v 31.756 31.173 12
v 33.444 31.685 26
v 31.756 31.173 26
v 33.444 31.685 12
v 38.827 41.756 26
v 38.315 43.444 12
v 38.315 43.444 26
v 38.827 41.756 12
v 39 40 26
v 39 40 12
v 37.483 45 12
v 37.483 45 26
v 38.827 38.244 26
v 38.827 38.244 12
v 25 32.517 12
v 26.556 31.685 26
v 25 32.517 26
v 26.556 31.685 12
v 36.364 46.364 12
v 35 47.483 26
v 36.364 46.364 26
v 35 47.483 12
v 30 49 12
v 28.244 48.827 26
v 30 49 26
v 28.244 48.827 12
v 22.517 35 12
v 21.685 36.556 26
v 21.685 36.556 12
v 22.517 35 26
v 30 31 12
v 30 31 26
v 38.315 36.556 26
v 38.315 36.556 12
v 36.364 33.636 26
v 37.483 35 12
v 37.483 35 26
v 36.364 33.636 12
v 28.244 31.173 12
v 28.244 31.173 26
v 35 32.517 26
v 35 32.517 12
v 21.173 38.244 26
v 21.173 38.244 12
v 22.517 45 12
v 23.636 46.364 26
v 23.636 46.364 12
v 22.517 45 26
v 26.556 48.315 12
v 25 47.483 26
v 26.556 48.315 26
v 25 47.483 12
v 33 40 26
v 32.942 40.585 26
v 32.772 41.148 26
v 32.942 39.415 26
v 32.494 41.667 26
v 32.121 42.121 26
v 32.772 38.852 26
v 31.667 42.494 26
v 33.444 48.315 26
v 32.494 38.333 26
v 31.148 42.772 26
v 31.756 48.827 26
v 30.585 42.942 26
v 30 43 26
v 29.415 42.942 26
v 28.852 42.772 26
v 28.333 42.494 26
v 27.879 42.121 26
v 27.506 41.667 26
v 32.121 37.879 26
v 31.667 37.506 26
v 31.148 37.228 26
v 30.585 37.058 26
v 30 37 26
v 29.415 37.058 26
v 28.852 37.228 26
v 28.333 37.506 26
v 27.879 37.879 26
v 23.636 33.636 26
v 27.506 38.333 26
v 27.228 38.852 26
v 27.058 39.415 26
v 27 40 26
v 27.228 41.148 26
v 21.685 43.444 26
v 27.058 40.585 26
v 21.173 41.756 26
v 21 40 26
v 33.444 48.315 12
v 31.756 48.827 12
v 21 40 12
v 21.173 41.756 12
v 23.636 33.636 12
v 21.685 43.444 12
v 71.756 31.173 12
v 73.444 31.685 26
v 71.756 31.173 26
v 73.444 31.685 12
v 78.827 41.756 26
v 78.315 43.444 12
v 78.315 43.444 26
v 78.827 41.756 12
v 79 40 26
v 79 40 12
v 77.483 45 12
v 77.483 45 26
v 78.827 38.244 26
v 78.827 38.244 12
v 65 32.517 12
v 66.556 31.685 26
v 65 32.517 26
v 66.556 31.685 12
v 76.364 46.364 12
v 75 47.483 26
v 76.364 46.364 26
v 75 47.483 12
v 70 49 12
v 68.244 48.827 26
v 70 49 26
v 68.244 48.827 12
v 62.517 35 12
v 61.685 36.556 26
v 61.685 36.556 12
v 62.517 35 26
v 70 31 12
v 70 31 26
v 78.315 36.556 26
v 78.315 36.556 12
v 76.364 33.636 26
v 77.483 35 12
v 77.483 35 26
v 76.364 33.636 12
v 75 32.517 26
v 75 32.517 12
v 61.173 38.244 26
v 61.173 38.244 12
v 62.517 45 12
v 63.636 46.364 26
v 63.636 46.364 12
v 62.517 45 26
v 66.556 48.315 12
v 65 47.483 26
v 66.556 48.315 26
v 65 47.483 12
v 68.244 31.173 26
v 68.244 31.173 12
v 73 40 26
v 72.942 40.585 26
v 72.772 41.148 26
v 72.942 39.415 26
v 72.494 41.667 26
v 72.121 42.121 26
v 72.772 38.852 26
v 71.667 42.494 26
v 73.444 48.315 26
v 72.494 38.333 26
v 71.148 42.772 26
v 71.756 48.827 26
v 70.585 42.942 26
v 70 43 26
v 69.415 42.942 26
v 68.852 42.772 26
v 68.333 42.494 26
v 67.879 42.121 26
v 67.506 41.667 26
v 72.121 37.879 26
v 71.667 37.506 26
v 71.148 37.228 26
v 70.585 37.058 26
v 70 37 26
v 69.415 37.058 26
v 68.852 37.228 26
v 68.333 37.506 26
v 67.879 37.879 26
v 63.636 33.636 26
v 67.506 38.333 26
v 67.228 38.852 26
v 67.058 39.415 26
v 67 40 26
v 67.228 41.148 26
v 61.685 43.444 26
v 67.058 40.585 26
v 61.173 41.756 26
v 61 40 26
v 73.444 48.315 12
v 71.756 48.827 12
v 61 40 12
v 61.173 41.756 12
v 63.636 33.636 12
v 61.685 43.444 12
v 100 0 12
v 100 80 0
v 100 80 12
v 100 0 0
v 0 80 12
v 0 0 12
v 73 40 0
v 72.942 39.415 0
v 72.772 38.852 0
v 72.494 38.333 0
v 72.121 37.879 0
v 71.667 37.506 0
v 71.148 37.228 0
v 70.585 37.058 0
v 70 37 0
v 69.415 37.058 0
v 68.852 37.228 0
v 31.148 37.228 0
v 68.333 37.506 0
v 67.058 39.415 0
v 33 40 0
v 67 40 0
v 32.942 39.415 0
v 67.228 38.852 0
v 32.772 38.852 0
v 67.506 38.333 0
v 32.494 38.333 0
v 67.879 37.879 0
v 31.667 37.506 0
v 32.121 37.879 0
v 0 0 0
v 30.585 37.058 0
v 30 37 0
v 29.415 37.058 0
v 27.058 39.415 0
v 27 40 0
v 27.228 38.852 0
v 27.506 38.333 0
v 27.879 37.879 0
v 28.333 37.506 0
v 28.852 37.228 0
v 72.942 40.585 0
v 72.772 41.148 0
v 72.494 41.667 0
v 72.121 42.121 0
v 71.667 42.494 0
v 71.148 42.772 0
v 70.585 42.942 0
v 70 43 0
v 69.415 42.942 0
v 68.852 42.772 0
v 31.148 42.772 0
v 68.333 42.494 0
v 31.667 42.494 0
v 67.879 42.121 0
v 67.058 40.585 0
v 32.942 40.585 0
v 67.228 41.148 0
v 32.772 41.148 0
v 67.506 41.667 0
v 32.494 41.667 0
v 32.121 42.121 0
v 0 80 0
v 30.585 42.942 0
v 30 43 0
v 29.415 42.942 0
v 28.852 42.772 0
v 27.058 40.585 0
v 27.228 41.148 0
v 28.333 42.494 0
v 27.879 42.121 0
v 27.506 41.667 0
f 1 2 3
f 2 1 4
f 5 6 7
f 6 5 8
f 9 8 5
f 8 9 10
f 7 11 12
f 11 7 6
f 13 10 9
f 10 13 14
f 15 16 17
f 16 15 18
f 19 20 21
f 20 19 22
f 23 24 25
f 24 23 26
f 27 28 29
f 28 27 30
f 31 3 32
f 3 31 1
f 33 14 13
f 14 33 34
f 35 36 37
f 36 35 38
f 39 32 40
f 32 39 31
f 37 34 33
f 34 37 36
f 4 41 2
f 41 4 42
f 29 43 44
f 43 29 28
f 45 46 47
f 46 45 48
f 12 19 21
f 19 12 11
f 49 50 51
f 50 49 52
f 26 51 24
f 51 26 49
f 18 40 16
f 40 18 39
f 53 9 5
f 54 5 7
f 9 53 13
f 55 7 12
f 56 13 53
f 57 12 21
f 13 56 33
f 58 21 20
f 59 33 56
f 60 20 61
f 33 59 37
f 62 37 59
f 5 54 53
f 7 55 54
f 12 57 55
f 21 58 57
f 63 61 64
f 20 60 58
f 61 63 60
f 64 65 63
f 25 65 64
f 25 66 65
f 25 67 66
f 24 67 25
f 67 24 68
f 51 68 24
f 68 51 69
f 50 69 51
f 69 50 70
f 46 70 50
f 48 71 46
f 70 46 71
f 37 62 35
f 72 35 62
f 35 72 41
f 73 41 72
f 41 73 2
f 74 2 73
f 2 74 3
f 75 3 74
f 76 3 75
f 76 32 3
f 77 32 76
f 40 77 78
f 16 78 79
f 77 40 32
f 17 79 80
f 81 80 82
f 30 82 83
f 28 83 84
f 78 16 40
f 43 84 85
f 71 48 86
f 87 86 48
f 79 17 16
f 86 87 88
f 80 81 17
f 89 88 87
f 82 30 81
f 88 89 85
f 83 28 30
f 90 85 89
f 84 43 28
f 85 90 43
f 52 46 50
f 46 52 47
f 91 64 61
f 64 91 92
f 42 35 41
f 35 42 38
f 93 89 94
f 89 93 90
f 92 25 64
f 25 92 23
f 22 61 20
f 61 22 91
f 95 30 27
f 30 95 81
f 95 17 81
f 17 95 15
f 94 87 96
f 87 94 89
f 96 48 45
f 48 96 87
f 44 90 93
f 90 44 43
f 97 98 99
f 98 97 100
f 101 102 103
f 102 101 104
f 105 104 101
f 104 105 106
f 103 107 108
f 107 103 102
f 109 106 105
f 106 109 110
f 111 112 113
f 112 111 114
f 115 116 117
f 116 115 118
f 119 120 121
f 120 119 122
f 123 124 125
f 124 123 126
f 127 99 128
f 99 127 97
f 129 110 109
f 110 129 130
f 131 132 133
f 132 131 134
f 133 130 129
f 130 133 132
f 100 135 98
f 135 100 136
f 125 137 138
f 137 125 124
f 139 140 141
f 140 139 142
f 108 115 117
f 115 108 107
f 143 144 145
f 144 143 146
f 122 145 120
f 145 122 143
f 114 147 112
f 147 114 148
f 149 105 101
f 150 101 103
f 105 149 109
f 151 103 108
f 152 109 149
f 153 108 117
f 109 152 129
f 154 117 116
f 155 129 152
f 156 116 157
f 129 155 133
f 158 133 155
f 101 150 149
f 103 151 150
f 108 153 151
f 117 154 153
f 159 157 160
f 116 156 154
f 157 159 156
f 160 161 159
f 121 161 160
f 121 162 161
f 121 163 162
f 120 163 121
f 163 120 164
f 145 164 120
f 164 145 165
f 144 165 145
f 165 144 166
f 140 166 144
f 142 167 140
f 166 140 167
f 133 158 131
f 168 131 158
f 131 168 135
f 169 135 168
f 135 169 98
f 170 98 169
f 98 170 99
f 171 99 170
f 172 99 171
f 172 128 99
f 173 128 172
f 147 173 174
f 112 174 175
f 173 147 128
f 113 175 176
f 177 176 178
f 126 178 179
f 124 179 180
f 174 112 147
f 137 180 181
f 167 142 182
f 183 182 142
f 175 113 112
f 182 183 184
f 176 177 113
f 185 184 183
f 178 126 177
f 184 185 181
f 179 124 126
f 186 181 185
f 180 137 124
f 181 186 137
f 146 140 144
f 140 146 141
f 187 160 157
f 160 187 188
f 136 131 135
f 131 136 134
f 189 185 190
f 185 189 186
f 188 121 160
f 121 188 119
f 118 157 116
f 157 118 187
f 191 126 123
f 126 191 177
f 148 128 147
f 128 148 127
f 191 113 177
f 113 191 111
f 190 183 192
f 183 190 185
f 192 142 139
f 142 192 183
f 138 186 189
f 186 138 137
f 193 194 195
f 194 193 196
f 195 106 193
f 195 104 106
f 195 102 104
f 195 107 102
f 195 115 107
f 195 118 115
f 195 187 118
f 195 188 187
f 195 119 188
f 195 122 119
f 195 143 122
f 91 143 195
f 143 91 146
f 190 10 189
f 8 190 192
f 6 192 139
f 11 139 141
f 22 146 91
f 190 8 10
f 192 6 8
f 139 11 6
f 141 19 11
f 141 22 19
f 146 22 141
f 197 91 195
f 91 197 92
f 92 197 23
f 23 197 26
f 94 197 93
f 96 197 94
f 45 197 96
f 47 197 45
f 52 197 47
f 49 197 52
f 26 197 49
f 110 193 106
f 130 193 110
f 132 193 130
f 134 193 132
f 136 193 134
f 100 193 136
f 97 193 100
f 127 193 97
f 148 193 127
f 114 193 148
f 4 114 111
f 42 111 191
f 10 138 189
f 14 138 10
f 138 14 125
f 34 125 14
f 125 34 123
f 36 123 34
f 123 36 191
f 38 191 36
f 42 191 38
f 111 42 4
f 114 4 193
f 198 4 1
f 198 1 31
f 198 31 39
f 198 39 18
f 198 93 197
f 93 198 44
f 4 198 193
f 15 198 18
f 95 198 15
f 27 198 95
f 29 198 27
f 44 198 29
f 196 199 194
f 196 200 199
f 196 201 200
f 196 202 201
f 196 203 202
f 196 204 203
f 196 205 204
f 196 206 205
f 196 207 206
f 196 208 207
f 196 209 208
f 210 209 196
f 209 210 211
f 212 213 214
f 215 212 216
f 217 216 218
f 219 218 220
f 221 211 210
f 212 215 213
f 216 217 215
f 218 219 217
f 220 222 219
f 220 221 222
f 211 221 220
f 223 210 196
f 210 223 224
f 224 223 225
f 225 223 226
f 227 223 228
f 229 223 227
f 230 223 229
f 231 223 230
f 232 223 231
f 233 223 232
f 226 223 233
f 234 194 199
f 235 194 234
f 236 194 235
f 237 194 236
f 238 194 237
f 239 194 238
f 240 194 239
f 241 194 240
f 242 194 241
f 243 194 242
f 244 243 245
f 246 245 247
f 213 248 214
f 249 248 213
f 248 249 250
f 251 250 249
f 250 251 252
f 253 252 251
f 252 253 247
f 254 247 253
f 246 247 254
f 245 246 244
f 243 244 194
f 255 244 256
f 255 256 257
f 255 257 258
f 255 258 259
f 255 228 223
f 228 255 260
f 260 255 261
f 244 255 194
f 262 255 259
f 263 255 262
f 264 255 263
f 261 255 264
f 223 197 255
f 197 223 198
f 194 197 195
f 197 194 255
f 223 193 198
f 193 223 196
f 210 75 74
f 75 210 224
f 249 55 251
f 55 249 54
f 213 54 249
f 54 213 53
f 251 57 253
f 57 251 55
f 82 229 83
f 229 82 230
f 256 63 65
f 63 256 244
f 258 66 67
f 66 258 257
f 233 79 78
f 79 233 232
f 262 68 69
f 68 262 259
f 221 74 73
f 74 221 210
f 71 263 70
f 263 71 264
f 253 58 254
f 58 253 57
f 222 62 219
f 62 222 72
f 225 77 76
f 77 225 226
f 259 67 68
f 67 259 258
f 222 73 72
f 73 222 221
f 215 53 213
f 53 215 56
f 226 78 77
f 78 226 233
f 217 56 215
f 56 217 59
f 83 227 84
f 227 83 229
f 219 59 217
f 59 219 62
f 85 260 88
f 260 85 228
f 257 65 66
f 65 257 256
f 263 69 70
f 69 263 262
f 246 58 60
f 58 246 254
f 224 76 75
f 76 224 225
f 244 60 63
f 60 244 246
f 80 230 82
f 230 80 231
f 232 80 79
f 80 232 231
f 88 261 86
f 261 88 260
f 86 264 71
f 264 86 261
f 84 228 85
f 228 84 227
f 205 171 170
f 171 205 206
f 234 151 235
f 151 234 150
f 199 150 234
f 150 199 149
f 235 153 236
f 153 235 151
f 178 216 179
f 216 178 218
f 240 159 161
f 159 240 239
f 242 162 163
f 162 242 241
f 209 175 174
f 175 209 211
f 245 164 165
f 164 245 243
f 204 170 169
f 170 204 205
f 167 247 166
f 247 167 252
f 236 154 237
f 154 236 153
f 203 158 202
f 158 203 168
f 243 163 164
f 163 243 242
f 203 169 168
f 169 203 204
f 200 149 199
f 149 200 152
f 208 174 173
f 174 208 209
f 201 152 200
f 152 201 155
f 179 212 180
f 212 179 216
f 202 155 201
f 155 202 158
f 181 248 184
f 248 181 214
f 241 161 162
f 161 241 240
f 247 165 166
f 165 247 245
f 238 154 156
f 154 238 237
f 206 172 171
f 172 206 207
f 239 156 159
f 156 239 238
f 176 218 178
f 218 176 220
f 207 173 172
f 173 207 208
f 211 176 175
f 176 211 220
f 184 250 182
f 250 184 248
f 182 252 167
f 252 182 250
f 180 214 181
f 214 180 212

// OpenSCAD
$fn = 32;

// ----------------------------------------------------------------------
// Drill jig: two_boss jig
// ----------------------------------------------------------------------

// --- parameters (mm) ---
plate_l = 100;            // plate length, X
plate_w = 80;             // plate width, Y
plate_t = 12;             // plate thickness
boss_d = 18;              // guide boss diameter
boss_h = 15;              // boss height above the plate
guide_d = 6;              // guide hole diameter
boss_pitch = 40;          // boss pitch

n_boss = 2;  // guide bosses
boss_x0 = (plate_l - (n_boss - 1) * boss_pitch) / 2;  // first boss X
boss_top = plate_t - 1 + boss_h;  // boss crown height
total_h = boss_top;  // overall height

difference() {
  union() {
  cube([plate_l, plate_w, plate_t]);
  for (i = [0 : n_boss - 1])
    translate([boss_x0 + i * boss_pitch, plate_w / 2, plate_t - 1])
      cylinder(h = boss_h, d = boss_d);
  }
  for (i = [0 : n_boss - 1])
    translate([boss_x0 + i * boss_pitch, plate_w / 2, -1])
      cylinder(h = plate_t + boss_h, d = guide_d);
}
